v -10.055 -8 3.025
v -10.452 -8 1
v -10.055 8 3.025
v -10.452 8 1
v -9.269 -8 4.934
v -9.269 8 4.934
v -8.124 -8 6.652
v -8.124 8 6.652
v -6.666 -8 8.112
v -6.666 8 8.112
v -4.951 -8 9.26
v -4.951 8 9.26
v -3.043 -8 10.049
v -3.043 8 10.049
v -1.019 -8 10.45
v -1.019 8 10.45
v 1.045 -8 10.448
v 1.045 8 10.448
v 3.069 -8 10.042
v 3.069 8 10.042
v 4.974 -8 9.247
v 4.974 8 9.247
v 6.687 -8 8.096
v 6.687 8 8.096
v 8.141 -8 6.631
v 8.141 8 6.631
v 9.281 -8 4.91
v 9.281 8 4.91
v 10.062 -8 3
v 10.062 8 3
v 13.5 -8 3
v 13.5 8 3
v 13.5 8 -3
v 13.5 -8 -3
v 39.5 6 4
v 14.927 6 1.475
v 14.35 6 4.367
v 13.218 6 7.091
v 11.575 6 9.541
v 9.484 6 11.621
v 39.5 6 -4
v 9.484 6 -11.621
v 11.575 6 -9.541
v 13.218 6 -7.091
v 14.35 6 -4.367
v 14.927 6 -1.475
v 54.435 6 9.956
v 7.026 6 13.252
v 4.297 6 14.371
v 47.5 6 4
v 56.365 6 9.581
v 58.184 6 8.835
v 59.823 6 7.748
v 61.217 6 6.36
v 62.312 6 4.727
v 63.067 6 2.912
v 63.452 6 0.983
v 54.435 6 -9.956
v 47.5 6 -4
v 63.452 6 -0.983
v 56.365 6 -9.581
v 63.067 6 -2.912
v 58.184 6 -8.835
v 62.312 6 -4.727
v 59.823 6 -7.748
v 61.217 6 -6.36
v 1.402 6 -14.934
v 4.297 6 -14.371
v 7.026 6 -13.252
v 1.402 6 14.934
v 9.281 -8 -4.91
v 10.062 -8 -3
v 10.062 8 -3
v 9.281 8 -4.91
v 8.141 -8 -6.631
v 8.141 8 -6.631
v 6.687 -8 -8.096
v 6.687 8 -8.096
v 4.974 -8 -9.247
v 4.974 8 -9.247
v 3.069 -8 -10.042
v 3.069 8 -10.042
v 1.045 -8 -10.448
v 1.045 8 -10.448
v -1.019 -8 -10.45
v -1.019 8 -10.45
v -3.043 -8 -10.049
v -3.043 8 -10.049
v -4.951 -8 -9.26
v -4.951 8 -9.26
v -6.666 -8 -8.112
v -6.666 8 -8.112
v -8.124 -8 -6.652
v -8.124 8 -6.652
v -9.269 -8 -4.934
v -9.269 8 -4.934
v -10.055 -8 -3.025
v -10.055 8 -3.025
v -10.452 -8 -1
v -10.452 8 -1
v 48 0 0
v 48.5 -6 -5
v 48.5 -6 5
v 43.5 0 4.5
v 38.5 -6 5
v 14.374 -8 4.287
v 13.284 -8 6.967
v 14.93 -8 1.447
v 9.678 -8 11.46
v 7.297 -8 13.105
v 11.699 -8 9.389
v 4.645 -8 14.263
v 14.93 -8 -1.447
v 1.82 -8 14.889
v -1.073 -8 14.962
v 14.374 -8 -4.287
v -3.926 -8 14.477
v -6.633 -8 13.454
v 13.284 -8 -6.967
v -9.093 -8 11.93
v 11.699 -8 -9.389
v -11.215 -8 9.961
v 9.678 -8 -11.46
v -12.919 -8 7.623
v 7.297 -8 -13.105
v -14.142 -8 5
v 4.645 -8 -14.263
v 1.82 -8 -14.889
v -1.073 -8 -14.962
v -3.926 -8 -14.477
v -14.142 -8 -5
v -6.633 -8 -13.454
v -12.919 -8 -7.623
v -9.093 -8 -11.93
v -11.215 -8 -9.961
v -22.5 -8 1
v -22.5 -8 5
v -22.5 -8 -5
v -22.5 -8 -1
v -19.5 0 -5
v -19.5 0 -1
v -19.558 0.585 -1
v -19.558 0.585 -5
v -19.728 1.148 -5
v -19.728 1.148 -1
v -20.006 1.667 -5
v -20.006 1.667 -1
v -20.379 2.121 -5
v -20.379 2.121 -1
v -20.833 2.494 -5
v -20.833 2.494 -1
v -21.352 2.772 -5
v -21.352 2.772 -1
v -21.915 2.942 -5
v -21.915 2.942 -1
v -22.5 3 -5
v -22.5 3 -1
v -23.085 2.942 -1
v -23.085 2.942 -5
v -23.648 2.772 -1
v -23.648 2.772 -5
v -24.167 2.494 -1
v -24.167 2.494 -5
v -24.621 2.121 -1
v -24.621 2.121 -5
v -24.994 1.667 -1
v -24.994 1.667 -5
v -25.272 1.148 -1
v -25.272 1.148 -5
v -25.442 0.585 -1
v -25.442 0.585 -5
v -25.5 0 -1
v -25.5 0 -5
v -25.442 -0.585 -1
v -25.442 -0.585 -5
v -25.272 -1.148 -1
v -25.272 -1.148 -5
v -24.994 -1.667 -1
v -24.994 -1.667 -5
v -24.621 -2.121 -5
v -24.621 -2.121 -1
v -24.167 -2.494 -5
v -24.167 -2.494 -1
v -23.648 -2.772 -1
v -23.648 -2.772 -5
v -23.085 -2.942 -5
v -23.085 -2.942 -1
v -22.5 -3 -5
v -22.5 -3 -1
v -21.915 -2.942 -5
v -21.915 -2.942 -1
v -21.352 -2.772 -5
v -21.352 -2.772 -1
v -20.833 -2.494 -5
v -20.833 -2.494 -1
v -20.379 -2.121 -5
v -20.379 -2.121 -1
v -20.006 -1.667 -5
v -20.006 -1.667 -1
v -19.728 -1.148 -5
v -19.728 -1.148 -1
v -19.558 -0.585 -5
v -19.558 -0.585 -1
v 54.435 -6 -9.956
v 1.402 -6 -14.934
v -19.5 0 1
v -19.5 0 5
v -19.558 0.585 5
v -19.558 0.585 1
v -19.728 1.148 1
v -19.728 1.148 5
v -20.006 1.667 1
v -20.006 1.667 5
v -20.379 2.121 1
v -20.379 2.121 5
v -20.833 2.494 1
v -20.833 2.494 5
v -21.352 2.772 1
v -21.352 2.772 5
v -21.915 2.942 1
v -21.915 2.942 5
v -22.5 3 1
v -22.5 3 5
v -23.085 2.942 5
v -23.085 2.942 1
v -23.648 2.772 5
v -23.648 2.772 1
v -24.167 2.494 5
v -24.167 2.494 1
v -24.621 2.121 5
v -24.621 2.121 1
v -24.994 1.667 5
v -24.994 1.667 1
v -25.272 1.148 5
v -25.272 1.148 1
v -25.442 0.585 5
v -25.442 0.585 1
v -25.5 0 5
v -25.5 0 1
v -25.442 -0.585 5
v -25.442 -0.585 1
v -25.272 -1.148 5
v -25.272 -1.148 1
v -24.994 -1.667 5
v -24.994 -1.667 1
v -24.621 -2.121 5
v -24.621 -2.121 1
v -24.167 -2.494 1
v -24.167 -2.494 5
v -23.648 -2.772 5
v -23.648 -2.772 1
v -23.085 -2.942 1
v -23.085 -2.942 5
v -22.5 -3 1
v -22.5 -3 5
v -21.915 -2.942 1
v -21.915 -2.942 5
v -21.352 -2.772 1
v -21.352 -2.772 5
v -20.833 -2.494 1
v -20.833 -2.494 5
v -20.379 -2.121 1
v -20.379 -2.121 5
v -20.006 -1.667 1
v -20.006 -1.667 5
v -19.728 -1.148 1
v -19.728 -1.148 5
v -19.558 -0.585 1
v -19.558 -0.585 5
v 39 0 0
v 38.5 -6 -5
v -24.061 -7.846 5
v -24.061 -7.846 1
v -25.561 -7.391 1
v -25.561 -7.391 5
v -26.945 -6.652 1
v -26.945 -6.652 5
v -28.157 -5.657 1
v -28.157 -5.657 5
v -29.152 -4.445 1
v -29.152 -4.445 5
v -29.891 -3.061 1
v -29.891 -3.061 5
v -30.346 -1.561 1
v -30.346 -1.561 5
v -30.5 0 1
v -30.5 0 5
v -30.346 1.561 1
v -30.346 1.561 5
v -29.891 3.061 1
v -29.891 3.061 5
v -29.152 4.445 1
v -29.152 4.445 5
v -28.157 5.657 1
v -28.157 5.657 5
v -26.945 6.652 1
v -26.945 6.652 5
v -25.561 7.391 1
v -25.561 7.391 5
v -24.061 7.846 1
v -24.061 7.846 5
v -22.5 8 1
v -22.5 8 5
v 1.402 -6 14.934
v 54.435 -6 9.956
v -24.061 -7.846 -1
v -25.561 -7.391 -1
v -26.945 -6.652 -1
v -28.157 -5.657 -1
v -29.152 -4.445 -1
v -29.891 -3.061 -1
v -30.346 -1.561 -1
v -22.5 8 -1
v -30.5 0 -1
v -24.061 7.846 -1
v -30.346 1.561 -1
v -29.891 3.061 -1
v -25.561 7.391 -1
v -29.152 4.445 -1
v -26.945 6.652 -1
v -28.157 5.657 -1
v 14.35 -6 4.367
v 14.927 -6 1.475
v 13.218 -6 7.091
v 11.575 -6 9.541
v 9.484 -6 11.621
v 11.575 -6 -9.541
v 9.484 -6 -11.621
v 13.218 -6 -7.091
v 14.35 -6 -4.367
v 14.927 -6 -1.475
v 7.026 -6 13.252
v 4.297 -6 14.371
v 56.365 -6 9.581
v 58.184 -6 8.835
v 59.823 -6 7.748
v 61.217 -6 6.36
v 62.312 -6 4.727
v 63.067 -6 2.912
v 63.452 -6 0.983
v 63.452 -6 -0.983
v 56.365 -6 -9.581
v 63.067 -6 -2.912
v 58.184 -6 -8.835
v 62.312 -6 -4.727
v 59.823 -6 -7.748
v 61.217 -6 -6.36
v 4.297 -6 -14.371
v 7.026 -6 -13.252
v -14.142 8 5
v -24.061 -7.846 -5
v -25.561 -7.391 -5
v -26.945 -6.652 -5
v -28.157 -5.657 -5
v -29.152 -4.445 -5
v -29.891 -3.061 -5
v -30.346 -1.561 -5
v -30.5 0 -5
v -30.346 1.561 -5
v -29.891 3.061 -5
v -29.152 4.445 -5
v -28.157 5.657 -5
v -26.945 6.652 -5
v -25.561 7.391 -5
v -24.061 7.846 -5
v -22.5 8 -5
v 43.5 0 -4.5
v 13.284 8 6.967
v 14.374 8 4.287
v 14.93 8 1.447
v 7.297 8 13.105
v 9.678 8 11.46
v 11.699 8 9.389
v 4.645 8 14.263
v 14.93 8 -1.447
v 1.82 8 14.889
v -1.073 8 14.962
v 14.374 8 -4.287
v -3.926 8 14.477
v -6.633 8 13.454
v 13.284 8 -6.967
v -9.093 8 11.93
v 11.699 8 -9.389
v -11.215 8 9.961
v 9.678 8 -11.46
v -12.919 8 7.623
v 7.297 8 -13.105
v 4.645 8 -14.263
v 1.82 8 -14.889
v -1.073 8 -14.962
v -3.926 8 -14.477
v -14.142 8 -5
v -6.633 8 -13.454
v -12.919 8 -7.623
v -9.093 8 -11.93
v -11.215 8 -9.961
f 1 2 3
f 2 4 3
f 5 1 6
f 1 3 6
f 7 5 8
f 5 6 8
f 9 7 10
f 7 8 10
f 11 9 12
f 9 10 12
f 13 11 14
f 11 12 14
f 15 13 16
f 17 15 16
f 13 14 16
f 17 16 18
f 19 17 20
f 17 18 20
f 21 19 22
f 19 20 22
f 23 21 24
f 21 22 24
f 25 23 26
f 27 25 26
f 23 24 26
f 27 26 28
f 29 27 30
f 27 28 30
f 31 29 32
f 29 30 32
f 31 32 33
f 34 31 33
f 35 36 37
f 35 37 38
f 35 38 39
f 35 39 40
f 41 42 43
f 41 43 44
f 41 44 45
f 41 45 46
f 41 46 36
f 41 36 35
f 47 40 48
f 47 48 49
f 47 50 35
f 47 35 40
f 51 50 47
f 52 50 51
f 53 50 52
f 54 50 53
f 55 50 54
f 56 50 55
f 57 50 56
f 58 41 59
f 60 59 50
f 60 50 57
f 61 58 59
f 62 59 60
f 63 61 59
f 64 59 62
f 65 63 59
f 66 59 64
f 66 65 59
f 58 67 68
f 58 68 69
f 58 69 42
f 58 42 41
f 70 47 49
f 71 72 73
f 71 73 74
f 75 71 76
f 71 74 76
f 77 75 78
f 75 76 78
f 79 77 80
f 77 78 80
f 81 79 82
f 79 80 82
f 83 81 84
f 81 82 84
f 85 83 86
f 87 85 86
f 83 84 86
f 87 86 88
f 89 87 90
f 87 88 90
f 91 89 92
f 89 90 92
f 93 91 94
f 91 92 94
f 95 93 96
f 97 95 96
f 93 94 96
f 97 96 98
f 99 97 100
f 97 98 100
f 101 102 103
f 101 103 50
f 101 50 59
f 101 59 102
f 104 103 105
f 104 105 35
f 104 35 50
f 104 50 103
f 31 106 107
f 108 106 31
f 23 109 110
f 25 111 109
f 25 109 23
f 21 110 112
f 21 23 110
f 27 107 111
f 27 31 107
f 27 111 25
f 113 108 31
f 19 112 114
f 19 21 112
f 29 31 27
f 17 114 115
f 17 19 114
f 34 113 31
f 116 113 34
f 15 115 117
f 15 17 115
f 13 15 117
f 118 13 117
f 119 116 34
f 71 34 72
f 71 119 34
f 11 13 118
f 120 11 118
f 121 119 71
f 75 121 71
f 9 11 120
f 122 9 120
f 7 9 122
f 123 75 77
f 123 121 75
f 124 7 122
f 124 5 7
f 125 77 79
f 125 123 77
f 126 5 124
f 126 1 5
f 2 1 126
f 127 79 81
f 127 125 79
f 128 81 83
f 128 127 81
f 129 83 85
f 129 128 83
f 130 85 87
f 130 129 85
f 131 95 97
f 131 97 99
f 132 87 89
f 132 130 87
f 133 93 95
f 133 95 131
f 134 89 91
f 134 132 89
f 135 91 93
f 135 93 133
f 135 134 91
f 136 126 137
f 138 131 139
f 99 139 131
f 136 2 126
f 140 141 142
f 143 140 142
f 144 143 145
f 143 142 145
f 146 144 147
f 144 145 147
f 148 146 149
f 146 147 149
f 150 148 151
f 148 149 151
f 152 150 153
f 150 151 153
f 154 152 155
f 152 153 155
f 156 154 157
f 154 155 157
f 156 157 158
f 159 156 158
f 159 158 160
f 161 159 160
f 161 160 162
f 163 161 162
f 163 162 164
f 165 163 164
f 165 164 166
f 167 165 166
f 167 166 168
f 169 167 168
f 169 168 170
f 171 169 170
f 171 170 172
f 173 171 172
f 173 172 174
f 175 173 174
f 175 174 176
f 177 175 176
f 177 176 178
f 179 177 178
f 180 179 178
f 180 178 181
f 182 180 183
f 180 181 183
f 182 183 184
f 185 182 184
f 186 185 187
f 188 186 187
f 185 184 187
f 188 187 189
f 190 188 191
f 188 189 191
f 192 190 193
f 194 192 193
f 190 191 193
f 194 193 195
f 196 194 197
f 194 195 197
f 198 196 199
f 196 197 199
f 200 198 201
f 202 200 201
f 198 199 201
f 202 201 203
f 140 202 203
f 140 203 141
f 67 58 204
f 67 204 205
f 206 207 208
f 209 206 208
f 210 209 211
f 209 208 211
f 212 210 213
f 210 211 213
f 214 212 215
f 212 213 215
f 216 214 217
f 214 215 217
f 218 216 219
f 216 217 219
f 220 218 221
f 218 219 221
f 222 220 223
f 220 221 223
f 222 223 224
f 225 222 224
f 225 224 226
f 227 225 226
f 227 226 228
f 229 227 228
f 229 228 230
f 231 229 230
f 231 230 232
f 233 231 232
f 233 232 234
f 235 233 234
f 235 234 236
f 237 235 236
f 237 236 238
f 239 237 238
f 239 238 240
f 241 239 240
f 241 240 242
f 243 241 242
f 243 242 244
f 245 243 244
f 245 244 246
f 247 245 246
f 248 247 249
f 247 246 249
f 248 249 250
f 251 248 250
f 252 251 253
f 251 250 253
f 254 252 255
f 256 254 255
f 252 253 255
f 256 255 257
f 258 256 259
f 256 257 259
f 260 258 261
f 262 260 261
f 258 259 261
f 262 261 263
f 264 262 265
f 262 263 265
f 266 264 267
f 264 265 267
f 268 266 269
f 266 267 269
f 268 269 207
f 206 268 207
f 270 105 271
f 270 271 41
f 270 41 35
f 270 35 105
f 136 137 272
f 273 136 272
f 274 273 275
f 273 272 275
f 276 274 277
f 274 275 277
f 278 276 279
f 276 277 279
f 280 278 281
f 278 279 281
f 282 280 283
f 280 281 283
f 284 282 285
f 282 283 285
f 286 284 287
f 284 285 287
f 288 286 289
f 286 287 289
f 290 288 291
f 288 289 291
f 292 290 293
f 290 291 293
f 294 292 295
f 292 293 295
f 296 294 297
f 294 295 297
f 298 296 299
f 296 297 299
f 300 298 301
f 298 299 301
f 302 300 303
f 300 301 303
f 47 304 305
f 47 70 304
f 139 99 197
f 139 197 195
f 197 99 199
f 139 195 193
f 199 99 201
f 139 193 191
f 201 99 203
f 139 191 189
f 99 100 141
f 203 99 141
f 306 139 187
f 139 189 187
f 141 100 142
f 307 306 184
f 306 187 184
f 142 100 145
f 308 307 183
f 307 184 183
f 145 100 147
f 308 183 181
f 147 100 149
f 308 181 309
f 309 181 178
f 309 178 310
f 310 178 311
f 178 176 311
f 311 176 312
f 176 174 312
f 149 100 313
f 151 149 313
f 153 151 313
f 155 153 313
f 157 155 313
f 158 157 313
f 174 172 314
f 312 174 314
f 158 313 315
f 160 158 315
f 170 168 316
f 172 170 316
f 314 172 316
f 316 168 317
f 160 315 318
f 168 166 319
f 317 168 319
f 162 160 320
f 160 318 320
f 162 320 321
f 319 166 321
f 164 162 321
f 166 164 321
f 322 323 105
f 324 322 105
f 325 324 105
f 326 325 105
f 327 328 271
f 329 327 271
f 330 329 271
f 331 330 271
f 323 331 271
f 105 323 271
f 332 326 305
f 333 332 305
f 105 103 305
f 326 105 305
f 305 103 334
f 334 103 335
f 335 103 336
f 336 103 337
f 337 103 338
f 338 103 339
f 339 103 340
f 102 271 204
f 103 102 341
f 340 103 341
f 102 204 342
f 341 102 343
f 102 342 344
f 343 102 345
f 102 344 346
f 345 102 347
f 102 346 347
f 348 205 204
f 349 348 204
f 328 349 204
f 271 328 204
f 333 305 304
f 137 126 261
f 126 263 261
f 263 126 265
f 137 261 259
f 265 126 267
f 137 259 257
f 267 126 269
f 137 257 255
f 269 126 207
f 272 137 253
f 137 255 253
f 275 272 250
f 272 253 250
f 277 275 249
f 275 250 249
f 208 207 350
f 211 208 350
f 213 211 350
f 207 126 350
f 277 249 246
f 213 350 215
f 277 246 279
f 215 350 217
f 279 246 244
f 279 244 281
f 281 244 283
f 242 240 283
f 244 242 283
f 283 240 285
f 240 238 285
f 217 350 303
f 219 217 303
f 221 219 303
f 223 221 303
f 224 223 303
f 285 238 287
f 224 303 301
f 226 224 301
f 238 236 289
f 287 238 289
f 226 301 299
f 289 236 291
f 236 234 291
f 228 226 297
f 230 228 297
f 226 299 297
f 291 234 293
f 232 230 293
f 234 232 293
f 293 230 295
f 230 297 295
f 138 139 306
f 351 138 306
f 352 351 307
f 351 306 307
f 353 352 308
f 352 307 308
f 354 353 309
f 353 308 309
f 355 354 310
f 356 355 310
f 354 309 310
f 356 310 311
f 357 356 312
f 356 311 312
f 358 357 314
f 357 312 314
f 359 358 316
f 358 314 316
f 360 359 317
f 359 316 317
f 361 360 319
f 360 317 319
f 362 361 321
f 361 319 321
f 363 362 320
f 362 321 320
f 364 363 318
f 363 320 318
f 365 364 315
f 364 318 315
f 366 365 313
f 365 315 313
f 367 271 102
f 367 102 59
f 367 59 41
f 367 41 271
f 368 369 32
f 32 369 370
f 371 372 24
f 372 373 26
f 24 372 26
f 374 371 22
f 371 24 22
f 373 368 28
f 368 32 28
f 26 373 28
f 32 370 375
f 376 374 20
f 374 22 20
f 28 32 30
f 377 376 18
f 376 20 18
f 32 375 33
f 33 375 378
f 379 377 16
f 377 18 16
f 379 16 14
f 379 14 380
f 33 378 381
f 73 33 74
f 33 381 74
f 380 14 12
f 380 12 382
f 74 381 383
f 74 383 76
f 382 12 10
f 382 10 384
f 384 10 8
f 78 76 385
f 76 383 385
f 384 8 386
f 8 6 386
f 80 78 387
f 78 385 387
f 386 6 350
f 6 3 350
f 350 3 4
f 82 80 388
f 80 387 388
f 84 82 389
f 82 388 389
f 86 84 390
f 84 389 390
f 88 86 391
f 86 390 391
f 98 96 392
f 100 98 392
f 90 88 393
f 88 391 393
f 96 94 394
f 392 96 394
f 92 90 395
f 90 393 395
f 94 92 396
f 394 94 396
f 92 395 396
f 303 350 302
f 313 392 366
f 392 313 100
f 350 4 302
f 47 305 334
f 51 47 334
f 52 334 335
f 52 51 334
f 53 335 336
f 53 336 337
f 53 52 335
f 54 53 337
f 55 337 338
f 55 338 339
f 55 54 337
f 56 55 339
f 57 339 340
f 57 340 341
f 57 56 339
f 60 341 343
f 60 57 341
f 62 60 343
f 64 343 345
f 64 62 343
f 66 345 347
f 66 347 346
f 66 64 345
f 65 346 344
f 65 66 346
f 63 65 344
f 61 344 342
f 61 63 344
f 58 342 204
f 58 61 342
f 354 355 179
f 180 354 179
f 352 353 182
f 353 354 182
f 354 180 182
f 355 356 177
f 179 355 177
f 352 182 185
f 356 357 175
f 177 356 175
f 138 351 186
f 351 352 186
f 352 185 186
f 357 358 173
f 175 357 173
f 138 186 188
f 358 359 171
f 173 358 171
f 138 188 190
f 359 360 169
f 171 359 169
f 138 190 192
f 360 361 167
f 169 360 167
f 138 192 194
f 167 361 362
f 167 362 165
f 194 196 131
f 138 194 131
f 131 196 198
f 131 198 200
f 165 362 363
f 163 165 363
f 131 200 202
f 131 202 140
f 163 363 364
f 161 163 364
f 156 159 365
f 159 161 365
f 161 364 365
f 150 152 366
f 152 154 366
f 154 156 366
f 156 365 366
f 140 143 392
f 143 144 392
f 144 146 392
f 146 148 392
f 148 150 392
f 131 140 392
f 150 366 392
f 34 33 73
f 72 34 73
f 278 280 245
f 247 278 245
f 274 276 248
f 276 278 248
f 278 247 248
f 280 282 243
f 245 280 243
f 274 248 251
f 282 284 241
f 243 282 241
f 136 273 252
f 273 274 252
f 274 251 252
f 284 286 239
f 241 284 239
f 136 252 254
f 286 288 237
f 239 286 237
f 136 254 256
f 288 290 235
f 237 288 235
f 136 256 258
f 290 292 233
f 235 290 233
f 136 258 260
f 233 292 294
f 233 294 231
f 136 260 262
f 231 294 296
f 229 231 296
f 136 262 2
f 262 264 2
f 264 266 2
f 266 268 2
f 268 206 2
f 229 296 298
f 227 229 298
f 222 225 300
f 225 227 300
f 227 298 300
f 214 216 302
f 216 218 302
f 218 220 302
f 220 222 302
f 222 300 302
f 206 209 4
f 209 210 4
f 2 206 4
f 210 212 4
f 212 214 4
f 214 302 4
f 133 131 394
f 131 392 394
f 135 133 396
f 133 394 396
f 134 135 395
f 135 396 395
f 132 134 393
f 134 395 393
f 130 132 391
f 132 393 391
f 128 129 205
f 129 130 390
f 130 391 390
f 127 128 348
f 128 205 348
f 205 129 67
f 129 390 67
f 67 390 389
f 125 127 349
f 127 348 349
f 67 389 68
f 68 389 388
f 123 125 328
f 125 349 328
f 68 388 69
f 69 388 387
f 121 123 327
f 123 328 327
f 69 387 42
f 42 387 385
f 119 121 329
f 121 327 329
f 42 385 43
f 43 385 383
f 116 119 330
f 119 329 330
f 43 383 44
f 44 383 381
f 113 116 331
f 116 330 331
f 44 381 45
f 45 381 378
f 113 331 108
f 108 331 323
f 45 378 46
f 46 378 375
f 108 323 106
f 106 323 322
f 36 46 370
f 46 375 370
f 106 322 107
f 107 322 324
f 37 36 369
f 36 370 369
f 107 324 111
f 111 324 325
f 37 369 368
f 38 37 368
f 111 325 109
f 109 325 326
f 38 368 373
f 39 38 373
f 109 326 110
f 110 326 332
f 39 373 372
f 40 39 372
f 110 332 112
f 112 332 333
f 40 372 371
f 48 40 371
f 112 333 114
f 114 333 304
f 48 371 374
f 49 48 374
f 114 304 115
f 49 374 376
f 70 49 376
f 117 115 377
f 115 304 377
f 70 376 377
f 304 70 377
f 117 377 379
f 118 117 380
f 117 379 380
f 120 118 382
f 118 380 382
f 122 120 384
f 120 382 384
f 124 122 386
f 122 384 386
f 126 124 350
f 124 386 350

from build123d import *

# Parameters (mm, degrees)
BOSS_EXTRUDE1_DEPTH = 8
BOSS_EXTRUDE2_DEPTH = 6
SKETCH2_R           = 3
CUT_EXTRUDE2_DEPTH  = 12


with BuildPart() as part:
    # Sketch1 → Boss-Extrude1 (new, symmetric)
    with BuildSketch(Plane(origin=(0, 0, 0), x_dir=(1, 0, 0), z_dir=(0, 1, 0))):
        with BuildLine():
            ThreePointArc((1.401869159, -14.934348424), (15, 0), (1.401869159, 14.934348424))
            ThreePointArc((1.401869159, 14.934348424), (-8.077834924, 12.639168602), (-14.142135624, 5))
            Line((-14.142135624, 5), (-30.5, 5))
            Line((-30.5, 5), (-30.5, 1))
            Line((-30.5, 1), (-10.45227248, 1))
            ThreePointArc((-10.45227248, 1), (-1.018831921, 10.450453651), (10.062305899, 3))
            Line((10.062305899, 3), (13.5, 3))
            Line((13.5, 3), (13.5, -3))
            Line((13.5, -3), (10.062305899, -3))
            ThreePointArc((10.062305899, -3), (-1.018831921, -10.450453651), (-10.45227248, -1))
            Line((-10.45227248, -1), (-30.5, -1))
            Line((-30.5, -1), (-30.5, -5))
            Line((-30.5, -5), (-14.142135624, -5))
            ThreePointArc((-14.142135624, -5), (-8.077834924, -12.639168602), (1.401869159, -14.934348424))
        make_face()
    extrude(amount=BOSS_EXTRUDE1_DEPTH, both=True)

    # Sketch1<4> → Boss-Extrude2 (add, symmetric)
    with BuildSketch(Plane(origin=(0, 0, 0), x_dir=(1, 0, 0), z_dir=(0, 1, 0))):
        with BuildLine():
            ThreePointArc((54.434579439, -9.956232283), (63.5, 0), (54.434579439, 9.956232283))
            Line((54.434579439, 9.956232283), (1.401869159, 14.934348424))
            ThreePointArc((1.401869159, 14.934348424), (15, 0), (1.401869159, -14.934348424))
            Line((1.401869159, -14.934348424), (54.434579439, -9.956232283))
        make_face()
    extrude(amount=BOSS_EXTRUDE2_DEPTH, both=True)

    # Sketch2 → Cut-Extrude2 (cut)
    with BuildSketch(Plane.XY.offset(5)):
        with Locations((-22.5, 0)):
            Circle(SKETCH2_R)
        with BuildLine():
            Line((-22.5, 8), (-22.5, 10.643526933))
            Line((-22.5, 10.643526933), (-32.266859183, 10.643526933))
            Line((-32.266859183, 10.643526933), (-32.266859183, -8))
            Line((-32.266859183, -8), (-32.266859183, -9.04856402))
            Line((-32.266859183, -9.04856402), (-22.5, -9.04856402))
            Line((-22.5, -9.04856402), (-22.5, -8))
            ThreePointArc((-22.5, -8), (-30.5, 0), (-22.5, 8))
        make_face()
    extrude(amount=-CUT_EXTRUDE2_DEPTH, mode=Mode.SUBTRACT)

    # Sketch4 → Cut-Loft1 section 0
    with BuildSketch(Plane.XZ.offset(6)):
        with BuildLine():
            Line((38.5, -5), (48.5, -5))
            Line((48.5, -5), (48.5, 5))
            Line((48.5, 5), (38.5, 5))
            Line((38.5, 5), (38.5, -5))
        make_face()
    # Sketch3 → Cut-Loft1 section 1
    with BuildSketch(Plane(origin=(0, 6, 0), x_dir=(1, 0, 0), z_dir=(0, 1, 0))):
        with BuildLine():
            Line((39.5, -4), (47.5, -4))
            Line((47.5, -4), (47.5, 4))
            Line((47.5, 4), (39.5, 4))
            Line((39.5, 4), (39.5, -4))
        make_face()
    loft(mode=Mode.SUBTRACT)


solid = part.part
